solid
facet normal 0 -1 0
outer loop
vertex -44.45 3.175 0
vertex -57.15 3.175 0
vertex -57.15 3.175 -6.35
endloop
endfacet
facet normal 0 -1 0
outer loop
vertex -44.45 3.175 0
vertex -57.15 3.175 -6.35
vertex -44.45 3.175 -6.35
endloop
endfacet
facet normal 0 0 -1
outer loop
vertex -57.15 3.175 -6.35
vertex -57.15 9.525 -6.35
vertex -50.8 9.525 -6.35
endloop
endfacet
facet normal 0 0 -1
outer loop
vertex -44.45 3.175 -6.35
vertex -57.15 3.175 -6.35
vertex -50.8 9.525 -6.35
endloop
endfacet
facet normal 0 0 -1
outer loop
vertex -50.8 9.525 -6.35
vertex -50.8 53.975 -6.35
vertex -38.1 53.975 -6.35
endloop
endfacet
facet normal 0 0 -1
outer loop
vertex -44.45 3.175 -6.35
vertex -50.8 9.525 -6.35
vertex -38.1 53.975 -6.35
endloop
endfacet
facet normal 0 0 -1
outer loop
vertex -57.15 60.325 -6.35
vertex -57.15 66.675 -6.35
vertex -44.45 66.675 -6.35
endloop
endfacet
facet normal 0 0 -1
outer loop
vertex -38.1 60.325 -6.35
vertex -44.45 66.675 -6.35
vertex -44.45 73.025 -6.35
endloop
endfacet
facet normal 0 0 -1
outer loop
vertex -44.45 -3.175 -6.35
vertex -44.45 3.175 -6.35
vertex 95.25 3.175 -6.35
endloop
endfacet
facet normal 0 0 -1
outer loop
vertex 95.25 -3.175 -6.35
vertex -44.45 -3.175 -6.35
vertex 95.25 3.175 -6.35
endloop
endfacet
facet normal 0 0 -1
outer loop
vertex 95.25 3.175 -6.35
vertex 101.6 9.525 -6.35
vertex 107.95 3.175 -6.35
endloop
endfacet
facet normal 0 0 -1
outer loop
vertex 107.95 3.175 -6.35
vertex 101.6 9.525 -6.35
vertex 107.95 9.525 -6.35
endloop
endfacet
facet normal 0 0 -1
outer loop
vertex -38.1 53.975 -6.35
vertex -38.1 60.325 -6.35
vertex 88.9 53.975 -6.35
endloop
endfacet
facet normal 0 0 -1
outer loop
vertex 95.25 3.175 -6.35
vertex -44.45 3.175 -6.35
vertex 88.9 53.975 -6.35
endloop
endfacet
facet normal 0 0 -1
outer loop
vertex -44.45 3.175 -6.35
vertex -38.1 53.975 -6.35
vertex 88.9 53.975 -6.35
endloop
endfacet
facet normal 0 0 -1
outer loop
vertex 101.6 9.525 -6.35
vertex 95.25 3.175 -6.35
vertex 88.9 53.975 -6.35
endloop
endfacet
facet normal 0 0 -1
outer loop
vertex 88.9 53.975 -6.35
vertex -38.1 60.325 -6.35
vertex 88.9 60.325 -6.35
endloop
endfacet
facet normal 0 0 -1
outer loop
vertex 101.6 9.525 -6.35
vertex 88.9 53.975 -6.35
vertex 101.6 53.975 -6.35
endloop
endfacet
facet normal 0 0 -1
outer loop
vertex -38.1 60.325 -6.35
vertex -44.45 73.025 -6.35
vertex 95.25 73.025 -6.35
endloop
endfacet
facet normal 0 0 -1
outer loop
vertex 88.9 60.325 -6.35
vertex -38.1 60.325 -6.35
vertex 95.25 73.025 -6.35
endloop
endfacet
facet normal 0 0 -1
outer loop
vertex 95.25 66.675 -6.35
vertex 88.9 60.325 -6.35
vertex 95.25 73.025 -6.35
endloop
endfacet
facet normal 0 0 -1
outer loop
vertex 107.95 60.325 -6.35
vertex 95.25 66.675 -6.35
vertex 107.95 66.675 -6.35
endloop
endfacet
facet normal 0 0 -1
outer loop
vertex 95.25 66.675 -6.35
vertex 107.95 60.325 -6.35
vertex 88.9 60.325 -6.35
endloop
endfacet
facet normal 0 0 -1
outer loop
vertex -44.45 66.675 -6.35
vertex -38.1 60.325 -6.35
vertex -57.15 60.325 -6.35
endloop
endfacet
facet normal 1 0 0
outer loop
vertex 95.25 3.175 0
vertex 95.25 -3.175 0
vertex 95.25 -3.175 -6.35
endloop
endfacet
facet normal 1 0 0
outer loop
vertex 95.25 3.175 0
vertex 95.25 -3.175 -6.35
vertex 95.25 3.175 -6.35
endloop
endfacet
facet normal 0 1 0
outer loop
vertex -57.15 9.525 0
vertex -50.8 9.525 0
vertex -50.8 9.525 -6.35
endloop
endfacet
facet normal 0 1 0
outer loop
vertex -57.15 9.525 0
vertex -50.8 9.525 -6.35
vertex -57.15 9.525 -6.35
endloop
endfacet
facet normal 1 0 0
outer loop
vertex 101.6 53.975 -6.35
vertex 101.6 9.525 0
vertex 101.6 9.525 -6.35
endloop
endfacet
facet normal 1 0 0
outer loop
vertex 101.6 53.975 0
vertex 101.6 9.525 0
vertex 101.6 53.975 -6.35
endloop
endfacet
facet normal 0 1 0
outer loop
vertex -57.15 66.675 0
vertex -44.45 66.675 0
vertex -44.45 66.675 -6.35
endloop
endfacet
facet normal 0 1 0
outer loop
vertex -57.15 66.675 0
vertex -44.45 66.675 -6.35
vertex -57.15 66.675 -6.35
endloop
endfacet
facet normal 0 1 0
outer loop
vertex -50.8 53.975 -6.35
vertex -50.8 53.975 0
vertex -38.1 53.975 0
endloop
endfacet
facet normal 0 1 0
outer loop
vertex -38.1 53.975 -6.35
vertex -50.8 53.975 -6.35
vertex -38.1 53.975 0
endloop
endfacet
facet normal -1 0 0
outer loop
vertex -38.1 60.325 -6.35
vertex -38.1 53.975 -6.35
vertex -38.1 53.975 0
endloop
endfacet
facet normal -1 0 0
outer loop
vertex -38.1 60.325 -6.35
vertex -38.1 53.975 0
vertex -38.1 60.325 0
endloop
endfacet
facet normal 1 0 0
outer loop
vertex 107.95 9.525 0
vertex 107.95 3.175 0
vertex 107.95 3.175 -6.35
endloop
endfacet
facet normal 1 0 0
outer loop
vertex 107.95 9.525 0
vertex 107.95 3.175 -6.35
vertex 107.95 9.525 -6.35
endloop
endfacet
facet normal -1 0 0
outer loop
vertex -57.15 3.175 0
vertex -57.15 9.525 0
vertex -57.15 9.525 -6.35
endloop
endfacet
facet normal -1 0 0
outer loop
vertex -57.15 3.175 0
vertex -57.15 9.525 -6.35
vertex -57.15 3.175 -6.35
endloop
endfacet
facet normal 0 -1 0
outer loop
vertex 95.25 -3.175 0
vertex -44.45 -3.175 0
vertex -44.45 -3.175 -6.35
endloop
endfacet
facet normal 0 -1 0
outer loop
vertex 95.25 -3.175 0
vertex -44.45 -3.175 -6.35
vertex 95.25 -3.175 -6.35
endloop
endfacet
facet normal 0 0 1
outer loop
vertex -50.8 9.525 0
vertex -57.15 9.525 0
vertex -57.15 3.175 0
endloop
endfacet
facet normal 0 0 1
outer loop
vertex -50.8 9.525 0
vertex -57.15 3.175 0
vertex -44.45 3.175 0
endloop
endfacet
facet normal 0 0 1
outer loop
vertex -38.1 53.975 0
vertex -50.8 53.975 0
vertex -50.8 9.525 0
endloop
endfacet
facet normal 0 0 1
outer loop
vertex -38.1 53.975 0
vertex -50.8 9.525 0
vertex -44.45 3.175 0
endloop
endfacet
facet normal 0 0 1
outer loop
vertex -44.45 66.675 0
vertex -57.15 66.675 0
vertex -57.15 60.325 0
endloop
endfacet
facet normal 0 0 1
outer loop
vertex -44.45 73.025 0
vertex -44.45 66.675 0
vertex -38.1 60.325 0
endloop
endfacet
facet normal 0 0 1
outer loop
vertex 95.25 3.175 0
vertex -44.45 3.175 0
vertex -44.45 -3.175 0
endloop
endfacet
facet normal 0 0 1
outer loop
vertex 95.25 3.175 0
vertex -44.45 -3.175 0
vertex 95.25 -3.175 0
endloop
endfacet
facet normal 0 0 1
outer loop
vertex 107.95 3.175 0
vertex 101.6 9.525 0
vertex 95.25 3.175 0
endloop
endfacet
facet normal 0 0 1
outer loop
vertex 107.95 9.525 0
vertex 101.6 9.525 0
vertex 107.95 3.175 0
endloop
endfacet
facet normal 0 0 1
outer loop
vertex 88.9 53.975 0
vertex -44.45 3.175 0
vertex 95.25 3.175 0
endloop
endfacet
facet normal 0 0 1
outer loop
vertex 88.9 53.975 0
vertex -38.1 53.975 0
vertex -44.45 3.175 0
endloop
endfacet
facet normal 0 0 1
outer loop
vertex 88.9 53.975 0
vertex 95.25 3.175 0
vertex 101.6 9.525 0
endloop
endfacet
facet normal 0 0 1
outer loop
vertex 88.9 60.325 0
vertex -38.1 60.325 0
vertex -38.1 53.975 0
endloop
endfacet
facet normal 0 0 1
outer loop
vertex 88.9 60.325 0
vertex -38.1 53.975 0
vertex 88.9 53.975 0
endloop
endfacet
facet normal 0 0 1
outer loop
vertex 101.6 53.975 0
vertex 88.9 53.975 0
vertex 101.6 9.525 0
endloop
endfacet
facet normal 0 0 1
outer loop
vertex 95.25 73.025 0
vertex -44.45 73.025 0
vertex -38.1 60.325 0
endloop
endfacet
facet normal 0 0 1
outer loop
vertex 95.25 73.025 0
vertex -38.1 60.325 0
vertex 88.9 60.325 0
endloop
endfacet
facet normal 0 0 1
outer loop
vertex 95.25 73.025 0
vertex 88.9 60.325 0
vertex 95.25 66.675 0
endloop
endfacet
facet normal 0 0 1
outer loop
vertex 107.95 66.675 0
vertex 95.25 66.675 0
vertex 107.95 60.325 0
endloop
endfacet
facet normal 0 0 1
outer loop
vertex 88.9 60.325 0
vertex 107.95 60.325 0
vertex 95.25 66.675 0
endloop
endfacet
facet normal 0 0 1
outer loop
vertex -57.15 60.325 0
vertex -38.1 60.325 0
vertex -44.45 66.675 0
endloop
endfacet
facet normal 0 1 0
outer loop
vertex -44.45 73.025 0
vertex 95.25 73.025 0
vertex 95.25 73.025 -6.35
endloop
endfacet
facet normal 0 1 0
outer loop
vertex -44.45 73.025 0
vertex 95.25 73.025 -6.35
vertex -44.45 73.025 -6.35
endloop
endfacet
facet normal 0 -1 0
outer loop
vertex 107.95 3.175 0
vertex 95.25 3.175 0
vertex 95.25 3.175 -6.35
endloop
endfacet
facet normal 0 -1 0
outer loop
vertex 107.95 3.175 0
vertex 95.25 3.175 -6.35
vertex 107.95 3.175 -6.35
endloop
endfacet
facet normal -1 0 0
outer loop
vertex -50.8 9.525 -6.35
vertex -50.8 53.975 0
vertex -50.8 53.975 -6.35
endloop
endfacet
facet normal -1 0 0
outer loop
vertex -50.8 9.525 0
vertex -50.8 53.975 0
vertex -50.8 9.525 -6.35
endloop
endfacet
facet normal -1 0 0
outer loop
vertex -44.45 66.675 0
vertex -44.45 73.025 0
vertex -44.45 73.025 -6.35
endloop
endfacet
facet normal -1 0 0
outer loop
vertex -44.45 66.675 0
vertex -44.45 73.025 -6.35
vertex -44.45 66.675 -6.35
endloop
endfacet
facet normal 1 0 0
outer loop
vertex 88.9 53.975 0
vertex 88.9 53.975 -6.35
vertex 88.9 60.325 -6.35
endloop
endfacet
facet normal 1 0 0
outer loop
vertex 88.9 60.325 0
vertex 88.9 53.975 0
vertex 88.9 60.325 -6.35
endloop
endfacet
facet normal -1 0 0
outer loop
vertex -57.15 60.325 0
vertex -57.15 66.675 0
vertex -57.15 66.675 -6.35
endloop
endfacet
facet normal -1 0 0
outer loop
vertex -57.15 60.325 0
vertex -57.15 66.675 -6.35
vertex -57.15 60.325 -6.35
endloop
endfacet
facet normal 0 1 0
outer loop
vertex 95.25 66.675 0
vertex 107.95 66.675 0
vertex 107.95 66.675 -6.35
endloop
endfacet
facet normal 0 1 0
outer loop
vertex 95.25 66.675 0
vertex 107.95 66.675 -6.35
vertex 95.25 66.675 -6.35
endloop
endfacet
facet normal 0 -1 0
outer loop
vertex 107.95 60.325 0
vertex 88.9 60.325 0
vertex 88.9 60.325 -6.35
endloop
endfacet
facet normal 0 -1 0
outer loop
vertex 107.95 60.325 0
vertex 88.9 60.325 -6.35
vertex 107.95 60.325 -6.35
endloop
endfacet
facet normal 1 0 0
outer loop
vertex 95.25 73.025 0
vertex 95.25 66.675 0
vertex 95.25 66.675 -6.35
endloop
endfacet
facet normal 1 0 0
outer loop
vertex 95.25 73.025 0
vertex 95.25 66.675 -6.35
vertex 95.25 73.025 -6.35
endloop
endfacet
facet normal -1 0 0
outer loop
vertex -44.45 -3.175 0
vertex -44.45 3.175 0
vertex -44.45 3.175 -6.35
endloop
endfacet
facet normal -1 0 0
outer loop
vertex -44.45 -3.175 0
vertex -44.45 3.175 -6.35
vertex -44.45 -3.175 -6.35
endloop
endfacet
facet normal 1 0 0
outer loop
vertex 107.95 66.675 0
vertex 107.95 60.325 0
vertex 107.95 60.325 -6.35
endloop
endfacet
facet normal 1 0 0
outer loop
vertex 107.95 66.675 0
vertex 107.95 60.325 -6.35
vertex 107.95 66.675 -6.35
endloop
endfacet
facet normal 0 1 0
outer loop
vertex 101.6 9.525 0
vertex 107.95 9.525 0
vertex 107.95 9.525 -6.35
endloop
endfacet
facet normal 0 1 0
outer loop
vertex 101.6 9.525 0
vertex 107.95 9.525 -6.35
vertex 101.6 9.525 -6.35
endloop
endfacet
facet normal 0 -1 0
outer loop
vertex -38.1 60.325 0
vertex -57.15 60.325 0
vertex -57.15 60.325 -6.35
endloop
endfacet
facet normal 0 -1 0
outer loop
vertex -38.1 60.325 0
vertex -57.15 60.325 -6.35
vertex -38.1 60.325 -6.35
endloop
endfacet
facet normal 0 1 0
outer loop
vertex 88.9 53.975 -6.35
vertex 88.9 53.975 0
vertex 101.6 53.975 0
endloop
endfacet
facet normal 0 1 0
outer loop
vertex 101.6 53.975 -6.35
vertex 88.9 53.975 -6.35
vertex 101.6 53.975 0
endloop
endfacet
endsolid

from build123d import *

# Parameters (mm, degrees)
BOSS_EXTRUDE1_DEPTH = 6.35
SKETCH2_W           = 19.05
SKETCH2_H           = 6.35
CUT_EXTRUDE1_DEPTH  = 131.484388434


with BuildPart() as part:
    # Sketch1 → Boss-Extrude1 (new body)
    with BuildSketch(Plane.XY):
        Polygon((107.95, 3.175), (107.95, 9.525), (101.6, 9.525), (101.6, 60.325), (107.95, 60.325), (107.95, 66.675), (95.25, 66.675), (95.25, 73.025), (-44.45, 73.025), (-44.45, 66.675), (-57.15, 66.675), (-57.15, 60.325), (-50.8, 60.325), (-50.8, 9.525), (-57.15, 9.525), (-57.15, 3.175), (-44.45, 3.175), (-44.45, -3.175), (95.25, -3.175), (95.25, 3.175), align=None)
    extrude(amount=-BOSS_EXTRUDE1_DEPTH)

    # Sketch2 → Cut-Extrude1 (cut, through all)
    with BuildSketch(Plane.XY):
        with Locations((98.425, 57.15)):
            Rectangle(SKETCH2_W, SKETCH2_H)
        with Locations((-47.625, 57.15)):
            Rectangle(SKETCH2_W, SKETCH2_H)
    extrude(amount=-CUT_EXTRUDE1_DEPTH, mode=Mode.SUBTRACT)


solid = part.part
